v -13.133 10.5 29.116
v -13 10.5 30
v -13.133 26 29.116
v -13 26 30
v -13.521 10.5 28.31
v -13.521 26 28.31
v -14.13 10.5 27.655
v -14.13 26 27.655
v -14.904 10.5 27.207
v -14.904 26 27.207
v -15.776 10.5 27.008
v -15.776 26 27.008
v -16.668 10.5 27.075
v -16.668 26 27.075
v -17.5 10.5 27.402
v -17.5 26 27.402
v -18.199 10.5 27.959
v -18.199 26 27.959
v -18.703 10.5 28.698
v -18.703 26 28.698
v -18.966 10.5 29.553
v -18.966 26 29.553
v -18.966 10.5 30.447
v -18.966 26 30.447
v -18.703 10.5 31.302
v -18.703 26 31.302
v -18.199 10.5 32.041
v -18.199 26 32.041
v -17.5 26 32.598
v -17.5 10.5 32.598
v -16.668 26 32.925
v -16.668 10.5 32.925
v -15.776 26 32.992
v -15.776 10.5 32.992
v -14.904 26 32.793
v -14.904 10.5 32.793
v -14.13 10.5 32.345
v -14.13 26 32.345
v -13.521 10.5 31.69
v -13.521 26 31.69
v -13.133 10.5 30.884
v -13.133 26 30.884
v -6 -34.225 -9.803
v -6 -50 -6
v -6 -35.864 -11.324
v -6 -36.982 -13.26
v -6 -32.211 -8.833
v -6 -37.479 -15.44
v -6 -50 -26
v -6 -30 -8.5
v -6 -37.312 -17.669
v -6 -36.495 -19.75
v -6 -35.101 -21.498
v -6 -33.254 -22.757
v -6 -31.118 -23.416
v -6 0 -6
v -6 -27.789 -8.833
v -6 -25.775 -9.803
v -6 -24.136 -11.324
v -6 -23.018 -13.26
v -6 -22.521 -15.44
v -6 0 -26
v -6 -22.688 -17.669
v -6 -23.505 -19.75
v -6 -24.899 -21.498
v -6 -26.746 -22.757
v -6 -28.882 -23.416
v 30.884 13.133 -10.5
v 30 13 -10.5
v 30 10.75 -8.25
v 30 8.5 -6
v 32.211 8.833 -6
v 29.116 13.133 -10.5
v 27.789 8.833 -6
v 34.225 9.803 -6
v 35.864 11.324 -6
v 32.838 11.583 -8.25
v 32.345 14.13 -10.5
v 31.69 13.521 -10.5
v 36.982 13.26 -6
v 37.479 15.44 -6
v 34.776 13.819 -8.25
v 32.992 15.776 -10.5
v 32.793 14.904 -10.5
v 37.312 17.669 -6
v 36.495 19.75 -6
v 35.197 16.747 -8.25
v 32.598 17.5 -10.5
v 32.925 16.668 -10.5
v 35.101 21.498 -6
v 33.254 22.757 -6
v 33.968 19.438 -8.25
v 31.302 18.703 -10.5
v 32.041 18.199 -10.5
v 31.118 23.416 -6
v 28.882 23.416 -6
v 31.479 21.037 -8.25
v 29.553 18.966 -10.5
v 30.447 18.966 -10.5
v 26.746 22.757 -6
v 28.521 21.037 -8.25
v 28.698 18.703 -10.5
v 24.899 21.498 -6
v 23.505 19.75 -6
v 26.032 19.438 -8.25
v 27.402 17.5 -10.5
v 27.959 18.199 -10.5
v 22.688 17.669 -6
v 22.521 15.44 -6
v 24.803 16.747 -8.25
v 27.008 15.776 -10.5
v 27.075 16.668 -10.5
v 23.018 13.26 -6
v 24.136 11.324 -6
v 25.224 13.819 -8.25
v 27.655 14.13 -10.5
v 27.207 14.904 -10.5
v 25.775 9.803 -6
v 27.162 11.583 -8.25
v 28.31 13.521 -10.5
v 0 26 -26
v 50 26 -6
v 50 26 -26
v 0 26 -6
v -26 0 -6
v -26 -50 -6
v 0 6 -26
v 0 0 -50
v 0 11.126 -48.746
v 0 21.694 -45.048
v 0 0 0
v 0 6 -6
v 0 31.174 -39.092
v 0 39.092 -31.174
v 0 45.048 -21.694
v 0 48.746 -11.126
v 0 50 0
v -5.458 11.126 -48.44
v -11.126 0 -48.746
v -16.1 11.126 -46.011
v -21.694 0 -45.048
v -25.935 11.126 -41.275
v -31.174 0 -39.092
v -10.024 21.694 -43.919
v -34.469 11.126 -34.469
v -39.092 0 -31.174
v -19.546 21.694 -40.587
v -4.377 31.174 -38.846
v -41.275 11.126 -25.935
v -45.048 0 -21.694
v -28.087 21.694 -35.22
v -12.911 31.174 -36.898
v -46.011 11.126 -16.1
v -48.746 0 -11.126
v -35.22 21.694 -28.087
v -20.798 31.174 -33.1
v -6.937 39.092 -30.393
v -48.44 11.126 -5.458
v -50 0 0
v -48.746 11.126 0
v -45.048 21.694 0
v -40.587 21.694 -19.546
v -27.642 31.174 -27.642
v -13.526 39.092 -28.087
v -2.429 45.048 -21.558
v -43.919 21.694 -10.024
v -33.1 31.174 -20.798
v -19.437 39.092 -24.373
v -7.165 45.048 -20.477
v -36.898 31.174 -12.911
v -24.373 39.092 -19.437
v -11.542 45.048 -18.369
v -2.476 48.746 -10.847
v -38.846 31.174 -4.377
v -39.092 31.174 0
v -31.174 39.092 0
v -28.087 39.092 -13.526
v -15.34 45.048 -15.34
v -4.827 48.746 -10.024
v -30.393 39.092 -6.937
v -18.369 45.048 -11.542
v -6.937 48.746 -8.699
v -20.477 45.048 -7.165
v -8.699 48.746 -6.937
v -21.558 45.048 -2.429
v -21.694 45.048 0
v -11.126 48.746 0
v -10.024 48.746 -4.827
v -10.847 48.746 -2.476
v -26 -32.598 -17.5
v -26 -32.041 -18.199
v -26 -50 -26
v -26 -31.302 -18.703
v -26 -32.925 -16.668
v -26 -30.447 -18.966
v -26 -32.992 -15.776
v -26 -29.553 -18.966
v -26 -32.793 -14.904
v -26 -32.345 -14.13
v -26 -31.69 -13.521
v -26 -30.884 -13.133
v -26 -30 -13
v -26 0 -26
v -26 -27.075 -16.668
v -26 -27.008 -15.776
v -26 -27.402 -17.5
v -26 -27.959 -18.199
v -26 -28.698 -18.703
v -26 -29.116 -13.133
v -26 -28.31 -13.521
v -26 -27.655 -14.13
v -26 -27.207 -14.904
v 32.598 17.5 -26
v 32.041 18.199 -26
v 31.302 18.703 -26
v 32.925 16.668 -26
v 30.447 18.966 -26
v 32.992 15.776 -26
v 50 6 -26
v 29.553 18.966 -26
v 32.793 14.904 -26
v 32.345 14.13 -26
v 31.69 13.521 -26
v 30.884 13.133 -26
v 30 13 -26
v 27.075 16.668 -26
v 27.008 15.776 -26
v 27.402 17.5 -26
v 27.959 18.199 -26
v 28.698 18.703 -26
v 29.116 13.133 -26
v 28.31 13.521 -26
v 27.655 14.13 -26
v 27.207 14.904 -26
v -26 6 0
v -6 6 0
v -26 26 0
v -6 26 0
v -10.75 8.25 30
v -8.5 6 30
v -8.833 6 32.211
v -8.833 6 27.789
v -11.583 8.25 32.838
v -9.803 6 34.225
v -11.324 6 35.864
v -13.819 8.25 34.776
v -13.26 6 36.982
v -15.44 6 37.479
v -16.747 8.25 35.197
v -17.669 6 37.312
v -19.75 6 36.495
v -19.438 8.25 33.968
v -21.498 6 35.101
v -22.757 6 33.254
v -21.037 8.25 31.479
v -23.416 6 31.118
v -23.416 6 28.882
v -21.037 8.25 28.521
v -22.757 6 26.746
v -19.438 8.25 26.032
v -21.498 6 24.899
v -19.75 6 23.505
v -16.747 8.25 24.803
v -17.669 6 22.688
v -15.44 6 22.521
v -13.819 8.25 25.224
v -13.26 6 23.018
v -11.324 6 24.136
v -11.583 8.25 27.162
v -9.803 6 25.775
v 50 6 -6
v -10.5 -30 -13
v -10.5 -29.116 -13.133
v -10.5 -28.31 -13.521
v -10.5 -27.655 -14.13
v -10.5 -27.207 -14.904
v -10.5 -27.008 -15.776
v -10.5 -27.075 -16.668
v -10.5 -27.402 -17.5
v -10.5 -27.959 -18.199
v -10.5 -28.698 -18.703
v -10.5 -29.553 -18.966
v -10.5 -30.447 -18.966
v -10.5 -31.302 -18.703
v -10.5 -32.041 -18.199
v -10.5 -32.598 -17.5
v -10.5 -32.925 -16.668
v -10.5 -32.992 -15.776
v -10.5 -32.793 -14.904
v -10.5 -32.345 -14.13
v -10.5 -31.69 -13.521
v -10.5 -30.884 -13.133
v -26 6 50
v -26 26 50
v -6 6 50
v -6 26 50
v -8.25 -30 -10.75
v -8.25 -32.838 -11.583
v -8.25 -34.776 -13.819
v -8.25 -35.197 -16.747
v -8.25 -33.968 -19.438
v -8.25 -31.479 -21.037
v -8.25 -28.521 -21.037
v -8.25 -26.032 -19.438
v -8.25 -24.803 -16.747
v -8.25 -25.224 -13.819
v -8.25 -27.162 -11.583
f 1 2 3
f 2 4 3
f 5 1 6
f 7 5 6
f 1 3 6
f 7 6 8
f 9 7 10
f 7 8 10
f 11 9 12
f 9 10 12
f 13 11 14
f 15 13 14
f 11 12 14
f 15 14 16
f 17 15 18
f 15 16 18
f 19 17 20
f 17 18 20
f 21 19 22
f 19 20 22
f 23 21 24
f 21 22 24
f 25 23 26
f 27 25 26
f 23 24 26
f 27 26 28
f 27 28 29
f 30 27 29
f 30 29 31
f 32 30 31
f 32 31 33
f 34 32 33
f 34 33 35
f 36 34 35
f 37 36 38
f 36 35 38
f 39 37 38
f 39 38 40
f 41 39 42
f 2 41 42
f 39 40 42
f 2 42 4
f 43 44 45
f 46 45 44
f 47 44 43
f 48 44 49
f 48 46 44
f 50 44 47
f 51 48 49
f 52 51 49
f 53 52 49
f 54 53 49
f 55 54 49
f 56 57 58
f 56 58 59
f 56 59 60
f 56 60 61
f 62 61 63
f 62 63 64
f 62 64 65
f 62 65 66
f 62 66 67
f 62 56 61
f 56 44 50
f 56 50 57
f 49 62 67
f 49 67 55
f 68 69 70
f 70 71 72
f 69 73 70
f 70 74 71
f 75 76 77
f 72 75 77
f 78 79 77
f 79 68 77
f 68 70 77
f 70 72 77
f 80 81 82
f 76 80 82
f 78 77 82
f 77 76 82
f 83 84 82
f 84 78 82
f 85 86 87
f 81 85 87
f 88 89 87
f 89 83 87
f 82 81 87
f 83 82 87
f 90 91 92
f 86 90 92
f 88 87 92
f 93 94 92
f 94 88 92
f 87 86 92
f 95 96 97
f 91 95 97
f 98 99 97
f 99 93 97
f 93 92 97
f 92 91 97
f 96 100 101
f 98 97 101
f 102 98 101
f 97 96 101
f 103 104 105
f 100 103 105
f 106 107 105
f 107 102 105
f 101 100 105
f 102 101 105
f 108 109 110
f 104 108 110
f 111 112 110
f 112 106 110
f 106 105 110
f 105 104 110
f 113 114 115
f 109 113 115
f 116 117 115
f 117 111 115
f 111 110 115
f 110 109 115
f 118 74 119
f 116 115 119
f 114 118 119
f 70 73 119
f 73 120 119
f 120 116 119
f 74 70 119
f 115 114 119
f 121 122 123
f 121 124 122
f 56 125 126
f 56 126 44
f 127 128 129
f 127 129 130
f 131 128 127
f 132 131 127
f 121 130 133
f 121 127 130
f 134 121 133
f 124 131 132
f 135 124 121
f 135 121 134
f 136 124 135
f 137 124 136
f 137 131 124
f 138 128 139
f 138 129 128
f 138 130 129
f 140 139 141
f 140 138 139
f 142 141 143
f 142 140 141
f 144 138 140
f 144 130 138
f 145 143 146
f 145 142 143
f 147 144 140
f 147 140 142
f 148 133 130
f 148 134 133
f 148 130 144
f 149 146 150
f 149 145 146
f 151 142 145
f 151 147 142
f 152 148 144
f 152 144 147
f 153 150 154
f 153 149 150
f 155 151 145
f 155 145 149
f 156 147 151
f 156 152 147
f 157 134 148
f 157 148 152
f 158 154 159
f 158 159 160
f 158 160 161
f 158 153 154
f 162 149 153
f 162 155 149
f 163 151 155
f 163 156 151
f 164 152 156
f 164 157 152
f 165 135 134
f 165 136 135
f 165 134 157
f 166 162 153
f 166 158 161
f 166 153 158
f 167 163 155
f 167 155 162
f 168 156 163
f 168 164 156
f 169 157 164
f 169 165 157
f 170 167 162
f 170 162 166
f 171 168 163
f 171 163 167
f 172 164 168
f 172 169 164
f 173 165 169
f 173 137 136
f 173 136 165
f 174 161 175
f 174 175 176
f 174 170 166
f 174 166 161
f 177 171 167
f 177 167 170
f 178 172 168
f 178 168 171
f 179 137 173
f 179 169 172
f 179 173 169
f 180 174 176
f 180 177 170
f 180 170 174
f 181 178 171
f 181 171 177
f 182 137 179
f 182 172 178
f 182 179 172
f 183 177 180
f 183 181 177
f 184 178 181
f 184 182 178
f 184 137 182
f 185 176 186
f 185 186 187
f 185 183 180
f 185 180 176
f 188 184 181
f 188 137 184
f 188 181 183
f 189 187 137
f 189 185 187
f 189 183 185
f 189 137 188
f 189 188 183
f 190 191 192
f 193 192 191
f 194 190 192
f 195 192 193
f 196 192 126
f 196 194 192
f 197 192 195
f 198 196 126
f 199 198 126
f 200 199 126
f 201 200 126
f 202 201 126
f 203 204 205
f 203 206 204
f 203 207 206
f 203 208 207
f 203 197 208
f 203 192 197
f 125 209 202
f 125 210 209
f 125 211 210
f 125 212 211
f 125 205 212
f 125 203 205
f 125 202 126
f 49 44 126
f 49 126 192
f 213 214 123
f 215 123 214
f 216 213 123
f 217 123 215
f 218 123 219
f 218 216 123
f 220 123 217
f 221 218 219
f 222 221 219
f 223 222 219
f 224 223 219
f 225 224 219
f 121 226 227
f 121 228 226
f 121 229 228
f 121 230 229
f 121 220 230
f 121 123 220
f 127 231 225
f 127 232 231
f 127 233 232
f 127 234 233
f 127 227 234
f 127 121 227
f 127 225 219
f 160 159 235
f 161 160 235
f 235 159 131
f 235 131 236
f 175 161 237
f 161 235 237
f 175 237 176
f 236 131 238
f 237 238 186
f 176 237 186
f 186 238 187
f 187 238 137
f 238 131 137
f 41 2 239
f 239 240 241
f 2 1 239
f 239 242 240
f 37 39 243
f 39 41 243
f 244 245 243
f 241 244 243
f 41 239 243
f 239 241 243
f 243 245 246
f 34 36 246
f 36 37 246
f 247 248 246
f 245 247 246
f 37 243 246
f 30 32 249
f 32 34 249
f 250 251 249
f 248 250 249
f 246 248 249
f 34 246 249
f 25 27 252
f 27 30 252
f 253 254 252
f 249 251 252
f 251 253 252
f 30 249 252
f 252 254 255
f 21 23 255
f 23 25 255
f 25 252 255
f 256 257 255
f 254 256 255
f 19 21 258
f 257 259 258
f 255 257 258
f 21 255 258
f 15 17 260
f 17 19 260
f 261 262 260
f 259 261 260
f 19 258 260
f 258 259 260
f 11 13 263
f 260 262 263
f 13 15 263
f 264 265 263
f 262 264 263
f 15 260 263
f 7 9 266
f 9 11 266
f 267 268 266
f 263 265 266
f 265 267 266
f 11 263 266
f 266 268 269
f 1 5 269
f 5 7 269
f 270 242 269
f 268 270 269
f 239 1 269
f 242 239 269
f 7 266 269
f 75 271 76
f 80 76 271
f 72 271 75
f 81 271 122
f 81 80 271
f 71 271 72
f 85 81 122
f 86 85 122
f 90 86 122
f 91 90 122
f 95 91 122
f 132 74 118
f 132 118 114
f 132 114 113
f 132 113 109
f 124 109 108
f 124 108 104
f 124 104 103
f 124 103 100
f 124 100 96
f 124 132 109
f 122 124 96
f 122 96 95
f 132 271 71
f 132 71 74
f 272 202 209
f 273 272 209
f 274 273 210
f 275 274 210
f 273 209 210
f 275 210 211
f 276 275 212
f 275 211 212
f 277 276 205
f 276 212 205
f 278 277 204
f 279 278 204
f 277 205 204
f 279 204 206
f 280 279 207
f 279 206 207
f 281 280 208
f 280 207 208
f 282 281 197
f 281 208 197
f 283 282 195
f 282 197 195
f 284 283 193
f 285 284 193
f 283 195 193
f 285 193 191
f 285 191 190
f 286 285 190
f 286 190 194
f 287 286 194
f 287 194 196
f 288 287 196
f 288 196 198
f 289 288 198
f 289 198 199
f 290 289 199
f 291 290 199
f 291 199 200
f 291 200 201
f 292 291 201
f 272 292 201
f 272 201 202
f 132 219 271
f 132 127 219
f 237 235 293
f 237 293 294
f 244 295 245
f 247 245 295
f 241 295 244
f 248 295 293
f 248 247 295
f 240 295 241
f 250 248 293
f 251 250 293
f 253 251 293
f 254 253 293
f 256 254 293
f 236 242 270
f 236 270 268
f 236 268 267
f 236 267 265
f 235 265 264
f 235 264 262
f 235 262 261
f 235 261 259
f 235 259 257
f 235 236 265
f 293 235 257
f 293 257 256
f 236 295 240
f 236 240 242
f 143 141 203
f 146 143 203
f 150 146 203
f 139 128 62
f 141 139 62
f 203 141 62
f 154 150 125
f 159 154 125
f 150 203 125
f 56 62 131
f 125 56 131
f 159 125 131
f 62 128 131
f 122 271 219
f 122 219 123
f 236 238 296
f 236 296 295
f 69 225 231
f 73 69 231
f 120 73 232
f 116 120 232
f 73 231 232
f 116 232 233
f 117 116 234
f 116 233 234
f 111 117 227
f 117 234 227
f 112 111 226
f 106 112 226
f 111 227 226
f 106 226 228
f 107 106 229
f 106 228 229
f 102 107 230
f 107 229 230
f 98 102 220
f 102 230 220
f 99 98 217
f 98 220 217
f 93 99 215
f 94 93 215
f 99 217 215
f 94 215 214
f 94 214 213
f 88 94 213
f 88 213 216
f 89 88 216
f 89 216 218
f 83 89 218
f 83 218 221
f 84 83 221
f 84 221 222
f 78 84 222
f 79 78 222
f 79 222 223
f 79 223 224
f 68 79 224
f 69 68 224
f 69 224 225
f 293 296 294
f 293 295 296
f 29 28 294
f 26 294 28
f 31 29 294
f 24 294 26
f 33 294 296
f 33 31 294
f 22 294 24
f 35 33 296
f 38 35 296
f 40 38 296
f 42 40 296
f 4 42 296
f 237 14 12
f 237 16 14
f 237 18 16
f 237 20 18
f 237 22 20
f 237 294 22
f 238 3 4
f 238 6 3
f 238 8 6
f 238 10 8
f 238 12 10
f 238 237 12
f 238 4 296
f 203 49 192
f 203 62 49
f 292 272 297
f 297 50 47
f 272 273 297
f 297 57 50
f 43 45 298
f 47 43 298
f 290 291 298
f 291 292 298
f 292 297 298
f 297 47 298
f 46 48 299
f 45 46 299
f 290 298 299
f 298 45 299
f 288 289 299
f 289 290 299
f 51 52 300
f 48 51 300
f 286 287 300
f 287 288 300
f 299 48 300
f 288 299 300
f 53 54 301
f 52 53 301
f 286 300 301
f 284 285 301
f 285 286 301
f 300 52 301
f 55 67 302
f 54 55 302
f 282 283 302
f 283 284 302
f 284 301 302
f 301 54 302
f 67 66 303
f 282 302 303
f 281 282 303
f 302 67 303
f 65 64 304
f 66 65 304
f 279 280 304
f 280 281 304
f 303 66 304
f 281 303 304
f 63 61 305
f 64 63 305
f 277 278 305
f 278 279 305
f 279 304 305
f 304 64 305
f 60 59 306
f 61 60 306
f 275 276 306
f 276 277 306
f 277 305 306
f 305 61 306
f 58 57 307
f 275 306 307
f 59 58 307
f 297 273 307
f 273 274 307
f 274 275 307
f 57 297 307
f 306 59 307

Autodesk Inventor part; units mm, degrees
ref_plane "YZ Plane" through (0, 0, 0) normal (1, 0, 0) x (0, 1, 0)
ref_plane "XZ Plane" through (0, 0, 0) normal (0, 1, 0) x (-1, 0, 0)
ref_plane "XY Plane" through (0, 0, 0) normal (0, 0, 1) x (1, 0, 0)
sketch "Náčrt1" plane through (0, 0, 0) normal (1, 0, 0) x (0, 1, 0)
  line L0 (0, 0) -> (50, 0)
  line L1 (50, 0) -> (50, -50)
  line L2 (50, -50) -> (0, -50)
  line L3 (0, -50) -> (0, 0)
  arc A0 (0, -50) -> (50, 0) centre (0, 0) ccw
  line L4 (0, 0) -> (6, 0)
  line L5 (0, -6) -> (0, 0)
  line L6 (6, -6) -> (26, -6)
  line L7 (26, -6) -> (26, -26)
  line L8 (26, -26) -> (6, -26)
  line L9 (6, -26) -> (6, -6)
  dimension "d0" = 50
  dimension "d1" = 50
  dimension "d2" = 50
  dimension "d4" = 6
  dimension "d5" = 6
  dimension "d6" = 20
  dimension "d7" = 20
extrude "Vysunutí1" add sketch "Náčrt1" against normal blind 50 contours L0 A0 L3 | L1 L2 A0 | L6 L7 L8 L9
revolve "Rotace1" cut sketch "Náčrt1" angle 90 about axis through (0, 0, 0) along (0, 1, 0) keep common part contours L0 A0 L3 | L6 L7 L8 L9
extrude "Vysunutí2" add sketch "Náčrt1" along normal blind 50 contours L6 L7 L8 L9
sketch "Náčrt2" plane through (0, 6, -6) normal (0, 0, 1) x (1, 0, 0)
  line L0 (50, 20) -> (50, 0) projected
  line L1 (0, 0) -> (50, 0) projected
  point P0 (0, -6)
  point P1 (30, 10)
  dimension "d13" = 20
  dimension "d21" = 10
hole "Díra1" at (30, 16, -6) direction (0, 0, -1) diameter 6 end through all countersink diameter 15 countersink angle 90
pattern_circular "Kruhové pole1" count 3 over 360 about axis through (0, 0, 0) along (-0.5774, 0.5774, -0.5774) of "Vysunutí2", "Díra1"
properties part number "ZakulacenaCast"
